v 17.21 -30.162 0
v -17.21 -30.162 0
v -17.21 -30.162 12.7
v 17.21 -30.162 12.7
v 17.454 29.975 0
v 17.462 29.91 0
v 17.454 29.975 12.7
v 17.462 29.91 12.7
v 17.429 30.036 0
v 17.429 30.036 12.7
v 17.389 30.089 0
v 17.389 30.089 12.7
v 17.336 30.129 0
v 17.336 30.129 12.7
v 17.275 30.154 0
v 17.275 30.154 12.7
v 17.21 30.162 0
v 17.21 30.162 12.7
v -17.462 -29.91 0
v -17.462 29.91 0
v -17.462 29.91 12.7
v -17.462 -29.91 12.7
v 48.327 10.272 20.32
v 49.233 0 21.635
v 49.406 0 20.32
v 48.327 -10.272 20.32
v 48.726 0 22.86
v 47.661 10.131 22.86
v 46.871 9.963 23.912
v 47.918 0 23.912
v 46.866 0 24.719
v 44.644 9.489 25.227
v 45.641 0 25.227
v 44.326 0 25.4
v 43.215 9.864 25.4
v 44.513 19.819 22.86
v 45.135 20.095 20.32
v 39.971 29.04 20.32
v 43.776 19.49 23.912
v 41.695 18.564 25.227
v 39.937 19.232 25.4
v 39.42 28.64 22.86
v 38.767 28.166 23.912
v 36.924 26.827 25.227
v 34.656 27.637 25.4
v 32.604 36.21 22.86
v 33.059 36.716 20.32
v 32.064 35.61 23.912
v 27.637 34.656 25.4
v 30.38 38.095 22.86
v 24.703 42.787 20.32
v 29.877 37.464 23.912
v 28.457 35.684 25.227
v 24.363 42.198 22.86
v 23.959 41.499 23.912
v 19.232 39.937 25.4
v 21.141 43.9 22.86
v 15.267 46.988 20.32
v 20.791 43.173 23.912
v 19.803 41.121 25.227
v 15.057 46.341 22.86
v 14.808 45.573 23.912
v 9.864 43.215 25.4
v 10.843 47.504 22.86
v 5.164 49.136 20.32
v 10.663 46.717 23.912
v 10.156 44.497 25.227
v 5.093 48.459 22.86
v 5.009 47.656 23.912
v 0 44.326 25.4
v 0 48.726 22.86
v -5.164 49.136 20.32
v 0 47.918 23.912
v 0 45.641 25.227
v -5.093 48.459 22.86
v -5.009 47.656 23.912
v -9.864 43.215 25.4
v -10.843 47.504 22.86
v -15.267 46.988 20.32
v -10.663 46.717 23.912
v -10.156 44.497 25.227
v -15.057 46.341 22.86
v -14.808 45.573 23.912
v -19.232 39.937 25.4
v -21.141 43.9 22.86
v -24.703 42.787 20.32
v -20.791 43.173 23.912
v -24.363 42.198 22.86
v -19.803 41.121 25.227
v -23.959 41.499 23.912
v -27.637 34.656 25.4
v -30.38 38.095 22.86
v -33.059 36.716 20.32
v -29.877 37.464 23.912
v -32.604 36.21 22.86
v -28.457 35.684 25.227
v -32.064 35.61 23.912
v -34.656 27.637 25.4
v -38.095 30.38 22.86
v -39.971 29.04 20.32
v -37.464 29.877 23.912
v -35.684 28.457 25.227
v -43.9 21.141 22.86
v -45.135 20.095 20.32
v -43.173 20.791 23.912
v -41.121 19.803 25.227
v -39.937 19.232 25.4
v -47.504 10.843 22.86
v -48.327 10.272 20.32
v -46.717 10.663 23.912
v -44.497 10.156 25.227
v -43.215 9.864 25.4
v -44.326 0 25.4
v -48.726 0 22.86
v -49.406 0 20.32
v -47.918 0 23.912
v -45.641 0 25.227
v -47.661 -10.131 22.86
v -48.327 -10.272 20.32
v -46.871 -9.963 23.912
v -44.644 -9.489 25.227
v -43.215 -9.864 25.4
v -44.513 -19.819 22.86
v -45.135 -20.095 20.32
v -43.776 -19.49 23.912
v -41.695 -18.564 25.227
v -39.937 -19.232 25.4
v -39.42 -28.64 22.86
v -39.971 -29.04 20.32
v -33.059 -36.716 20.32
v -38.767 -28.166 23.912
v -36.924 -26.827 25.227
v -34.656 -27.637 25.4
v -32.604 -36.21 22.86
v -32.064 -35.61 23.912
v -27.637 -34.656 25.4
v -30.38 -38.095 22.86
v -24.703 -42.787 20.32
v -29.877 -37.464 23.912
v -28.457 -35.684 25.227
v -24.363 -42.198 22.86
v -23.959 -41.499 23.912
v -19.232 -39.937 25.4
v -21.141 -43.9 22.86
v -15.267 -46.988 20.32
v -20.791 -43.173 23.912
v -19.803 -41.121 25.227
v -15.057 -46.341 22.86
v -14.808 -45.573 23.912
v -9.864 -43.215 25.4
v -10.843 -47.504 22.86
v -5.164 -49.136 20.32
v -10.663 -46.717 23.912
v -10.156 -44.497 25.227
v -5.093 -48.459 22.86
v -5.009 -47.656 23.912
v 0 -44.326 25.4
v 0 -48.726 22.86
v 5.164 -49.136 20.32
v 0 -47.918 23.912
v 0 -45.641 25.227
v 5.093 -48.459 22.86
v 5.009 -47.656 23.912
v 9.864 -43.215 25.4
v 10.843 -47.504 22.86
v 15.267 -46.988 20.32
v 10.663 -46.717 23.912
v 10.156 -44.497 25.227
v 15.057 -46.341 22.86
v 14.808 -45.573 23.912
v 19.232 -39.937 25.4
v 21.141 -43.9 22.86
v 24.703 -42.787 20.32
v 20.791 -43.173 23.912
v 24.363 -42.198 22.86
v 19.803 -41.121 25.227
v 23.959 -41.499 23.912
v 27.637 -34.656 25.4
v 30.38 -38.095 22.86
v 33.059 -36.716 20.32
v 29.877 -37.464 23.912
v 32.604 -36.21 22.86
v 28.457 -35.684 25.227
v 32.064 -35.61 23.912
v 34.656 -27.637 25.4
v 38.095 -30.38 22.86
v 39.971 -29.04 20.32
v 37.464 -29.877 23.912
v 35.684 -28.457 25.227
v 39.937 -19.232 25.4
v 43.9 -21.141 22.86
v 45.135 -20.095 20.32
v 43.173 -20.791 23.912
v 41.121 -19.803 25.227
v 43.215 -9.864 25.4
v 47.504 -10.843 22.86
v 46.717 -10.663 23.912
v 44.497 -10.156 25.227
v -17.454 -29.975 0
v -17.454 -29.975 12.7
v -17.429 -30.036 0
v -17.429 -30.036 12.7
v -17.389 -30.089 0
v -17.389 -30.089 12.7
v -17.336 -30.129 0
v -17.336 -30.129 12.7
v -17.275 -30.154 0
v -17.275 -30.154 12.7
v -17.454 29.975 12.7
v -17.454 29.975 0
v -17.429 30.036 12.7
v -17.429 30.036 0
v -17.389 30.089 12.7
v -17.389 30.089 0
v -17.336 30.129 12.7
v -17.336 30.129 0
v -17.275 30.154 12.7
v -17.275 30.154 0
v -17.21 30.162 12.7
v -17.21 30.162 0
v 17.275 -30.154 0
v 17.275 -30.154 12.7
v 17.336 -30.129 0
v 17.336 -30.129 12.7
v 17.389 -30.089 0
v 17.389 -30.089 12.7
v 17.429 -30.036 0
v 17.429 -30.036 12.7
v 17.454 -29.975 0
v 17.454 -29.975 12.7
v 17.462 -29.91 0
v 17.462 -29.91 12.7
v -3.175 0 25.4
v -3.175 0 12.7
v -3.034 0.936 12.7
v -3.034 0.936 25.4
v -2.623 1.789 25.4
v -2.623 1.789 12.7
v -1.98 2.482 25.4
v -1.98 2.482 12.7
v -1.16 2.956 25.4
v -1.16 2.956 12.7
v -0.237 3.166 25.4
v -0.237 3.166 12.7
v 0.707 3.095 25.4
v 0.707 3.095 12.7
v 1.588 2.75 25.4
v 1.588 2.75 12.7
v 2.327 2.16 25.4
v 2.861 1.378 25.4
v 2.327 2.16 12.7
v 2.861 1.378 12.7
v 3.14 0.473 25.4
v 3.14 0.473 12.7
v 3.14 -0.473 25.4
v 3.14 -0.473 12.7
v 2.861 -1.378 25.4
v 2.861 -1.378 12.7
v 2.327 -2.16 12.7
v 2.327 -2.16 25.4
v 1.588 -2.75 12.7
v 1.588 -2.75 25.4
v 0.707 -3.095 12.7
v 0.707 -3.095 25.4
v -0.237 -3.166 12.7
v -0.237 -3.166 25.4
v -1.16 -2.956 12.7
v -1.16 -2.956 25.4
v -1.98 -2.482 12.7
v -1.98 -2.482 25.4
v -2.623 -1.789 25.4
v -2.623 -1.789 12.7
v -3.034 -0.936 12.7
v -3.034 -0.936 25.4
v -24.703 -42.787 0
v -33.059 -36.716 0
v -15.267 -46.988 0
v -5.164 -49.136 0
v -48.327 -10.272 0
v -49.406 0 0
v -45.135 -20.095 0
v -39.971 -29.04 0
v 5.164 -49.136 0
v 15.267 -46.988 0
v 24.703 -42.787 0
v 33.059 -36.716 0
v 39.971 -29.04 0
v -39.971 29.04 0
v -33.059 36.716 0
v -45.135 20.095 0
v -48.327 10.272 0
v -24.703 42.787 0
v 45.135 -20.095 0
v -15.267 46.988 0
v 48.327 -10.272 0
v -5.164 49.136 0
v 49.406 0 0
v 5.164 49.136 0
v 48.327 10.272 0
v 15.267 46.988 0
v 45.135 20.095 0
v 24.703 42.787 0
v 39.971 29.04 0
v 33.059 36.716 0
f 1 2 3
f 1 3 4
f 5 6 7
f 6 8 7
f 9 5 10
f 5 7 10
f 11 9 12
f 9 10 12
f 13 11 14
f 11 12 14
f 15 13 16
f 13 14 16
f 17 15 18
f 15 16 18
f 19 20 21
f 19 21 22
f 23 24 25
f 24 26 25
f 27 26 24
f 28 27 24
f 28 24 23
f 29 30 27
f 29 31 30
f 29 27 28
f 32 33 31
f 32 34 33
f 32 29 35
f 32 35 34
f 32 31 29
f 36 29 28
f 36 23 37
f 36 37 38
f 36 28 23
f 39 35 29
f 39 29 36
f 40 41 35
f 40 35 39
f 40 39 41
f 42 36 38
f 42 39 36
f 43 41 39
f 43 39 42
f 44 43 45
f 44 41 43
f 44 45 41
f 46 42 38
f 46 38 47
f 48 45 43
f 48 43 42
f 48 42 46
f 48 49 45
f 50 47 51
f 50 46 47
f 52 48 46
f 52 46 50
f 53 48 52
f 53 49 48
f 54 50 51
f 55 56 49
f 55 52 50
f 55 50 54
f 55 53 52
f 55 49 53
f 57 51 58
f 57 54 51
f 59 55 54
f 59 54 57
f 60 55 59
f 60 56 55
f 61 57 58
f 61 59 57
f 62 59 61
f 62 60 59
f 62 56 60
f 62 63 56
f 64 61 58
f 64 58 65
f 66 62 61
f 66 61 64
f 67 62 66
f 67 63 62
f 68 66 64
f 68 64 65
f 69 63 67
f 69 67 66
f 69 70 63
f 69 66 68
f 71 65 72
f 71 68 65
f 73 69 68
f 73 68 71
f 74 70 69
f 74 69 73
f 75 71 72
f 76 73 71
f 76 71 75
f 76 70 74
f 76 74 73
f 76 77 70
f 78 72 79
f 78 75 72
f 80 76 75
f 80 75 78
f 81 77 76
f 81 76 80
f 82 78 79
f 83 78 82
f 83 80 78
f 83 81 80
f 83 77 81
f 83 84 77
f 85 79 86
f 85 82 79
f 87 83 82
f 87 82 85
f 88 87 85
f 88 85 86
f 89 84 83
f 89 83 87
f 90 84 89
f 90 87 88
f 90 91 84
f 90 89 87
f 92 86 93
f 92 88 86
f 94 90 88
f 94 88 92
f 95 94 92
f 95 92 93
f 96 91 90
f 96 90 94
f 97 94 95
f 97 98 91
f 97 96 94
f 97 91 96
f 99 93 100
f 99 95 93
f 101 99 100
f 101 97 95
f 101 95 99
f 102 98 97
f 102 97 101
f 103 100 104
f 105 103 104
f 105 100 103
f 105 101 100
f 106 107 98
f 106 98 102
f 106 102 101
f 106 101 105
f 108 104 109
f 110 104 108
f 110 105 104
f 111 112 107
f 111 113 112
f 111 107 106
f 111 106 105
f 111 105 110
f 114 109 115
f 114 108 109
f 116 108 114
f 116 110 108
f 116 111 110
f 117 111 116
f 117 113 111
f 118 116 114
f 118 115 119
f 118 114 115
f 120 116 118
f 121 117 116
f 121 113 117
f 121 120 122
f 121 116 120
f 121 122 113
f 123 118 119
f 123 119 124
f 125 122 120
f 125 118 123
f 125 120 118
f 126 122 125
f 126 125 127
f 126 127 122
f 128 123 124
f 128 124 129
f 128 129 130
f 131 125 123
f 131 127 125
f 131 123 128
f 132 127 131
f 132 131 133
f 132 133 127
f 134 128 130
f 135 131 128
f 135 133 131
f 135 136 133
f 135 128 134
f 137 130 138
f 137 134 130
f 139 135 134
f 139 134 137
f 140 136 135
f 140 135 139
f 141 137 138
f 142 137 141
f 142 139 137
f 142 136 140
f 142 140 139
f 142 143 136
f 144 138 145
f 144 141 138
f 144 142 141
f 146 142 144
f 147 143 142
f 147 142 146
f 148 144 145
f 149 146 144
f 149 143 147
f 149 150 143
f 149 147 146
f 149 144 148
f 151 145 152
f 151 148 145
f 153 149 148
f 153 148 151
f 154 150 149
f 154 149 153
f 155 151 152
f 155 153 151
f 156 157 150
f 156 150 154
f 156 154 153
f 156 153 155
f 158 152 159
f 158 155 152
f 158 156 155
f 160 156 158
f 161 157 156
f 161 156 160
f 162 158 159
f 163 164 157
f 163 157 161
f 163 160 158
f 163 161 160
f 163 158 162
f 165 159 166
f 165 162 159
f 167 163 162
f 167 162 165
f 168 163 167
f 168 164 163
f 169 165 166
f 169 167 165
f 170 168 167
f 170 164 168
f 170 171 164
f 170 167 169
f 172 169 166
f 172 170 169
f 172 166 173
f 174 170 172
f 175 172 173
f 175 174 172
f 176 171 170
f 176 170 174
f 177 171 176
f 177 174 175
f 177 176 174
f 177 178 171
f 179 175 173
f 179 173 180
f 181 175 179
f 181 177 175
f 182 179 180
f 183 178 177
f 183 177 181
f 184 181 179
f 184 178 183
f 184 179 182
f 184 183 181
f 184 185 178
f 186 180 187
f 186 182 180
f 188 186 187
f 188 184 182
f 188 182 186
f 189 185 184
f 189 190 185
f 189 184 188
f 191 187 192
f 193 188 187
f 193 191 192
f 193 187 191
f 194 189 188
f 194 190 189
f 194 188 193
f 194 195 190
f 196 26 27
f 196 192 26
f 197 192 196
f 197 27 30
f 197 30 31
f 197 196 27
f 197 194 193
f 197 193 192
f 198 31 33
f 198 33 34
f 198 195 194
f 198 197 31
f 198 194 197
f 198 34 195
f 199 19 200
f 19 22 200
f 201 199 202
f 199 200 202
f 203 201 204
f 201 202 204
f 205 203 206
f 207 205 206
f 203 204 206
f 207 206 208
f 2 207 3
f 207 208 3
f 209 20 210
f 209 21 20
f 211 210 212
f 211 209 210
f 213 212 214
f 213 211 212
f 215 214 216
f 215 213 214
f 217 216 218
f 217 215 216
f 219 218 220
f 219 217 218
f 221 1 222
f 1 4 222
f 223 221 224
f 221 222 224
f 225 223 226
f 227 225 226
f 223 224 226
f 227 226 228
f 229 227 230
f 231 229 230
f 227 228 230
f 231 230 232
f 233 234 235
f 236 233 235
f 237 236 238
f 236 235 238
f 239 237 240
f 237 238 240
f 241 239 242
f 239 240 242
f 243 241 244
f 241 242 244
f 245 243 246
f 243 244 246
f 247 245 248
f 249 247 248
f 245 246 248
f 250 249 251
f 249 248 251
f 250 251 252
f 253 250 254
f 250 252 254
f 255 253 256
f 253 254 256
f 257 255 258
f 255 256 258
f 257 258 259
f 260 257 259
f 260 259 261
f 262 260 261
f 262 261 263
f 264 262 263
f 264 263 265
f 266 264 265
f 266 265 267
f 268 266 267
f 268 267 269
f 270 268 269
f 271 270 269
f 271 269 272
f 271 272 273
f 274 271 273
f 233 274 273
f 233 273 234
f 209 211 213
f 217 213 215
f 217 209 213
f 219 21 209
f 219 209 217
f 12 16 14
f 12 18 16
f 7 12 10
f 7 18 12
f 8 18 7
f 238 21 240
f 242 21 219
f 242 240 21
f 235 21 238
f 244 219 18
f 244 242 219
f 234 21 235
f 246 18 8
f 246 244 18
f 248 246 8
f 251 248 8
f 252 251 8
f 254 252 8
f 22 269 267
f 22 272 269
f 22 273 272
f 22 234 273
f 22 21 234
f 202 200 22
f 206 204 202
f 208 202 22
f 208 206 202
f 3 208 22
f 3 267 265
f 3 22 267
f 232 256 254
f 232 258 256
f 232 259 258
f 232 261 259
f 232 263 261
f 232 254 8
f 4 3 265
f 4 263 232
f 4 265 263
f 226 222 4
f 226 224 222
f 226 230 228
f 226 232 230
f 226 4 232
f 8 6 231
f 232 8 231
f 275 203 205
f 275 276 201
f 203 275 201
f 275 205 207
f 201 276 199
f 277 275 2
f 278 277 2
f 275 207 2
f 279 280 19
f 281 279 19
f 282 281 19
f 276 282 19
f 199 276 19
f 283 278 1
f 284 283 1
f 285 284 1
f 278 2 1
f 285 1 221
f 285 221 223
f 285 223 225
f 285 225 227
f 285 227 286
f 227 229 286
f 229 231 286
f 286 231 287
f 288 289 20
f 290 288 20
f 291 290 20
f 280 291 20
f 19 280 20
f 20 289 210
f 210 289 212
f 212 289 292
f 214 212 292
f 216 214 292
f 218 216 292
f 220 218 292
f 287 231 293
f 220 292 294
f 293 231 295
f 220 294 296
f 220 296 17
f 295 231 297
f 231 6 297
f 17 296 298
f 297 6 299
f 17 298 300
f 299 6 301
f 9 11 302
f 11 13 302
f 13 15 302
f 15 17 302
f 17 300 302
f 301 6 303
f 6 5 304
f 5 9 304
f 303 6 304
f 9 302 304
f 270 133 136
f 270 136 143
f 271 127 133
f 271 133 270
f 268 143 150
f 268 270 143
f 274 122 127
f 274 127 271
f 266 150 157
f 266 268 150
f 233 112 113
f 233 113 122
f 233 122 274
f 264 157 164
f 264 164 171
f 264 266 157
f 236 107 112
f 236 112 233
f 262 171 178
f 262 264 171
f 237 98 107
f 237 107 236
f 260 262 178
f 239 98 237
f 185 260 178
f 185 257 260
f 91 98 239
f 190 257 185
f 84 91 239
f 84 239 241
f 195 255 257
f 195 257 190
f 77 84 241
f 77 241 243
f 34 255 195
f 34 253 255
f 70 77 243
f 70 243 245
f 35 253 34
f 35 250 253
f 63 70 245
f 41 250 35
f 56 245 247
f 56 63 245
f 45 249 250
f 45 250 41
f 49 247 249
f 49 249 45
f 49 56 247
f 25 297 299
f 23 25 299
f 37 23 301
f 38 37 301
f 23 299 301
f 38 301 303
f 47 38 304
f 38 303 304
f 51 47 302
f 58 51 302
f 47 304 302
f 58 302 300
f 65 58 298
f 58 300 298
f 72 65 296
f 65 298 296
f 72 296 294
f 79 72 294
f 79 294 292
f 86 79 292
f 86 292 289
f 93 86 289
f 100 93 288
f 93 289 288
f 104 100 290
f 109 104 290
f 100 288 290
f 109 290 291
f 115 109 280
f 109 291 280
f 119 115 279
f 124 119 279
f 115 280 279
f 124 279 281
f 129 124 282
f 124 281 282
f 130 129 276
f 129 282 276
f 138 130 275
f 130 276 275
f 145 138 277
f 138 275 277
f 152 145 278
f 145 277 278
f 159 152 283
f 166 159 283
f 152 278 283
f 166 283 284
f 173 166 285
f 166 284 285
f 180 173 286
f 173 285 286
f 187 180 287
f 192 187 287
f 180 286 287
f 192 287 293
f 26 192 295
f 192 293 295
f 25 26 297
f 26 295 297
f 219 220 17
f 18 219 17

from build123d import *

# Parameters (mm, degrees)
F0_R     = 49.406354
F1_DEPTH = 25.4
F3_D     = 6.35
F4_W     = 34.925
F4_H     = 60.325
F5_DEPTH = 12.7
F6_R     = 5.08
F7_R     = 0.252521


with BuildPart() as f1:
    # F0 (on Top) → F1 (new body)
    with BuildSketch(Plane.XY):
        Circle(F0_R)
    extrude(amount=F1_DEPTH)

    # F3 (through all)
    with Locations(Plane.XY.offset(25.4)):
        with Locations((0, 0)):
            Hole(F3_D / 2)

    # F4 (on face) → F5 (cut)
    with BuildSketch(Plane(origin=(0, 0, 0), x_dir=(1, 0, 0), z_dir=(0, 0, -1))):
        Rectangle(F4_W, F4_H)
    extrude(amount=-F5_DEPTH, mode=Mode.SUBTRACT)

    # F6
    f6_edges = [f1.edges().sort_by_distance(p)[0] for p in [
        (-49.406354, 0, 25.4),
    ]]
    fillet(f6_edges, radius=F6_R)

    # F7
    f7_edges = [f1.edges().sort_by_distance(p)[0] for p in [
        (-17.4625, 30.1625, 6.35),
        (17.4625, 30.1625, 6.35),
        (-17.4625, -30.1625, 6.35),
        (17.4625, -30.1625, 6.35),
    ]]
    fillet(f7_edges, radius=F7_R)


solid = f1.part
